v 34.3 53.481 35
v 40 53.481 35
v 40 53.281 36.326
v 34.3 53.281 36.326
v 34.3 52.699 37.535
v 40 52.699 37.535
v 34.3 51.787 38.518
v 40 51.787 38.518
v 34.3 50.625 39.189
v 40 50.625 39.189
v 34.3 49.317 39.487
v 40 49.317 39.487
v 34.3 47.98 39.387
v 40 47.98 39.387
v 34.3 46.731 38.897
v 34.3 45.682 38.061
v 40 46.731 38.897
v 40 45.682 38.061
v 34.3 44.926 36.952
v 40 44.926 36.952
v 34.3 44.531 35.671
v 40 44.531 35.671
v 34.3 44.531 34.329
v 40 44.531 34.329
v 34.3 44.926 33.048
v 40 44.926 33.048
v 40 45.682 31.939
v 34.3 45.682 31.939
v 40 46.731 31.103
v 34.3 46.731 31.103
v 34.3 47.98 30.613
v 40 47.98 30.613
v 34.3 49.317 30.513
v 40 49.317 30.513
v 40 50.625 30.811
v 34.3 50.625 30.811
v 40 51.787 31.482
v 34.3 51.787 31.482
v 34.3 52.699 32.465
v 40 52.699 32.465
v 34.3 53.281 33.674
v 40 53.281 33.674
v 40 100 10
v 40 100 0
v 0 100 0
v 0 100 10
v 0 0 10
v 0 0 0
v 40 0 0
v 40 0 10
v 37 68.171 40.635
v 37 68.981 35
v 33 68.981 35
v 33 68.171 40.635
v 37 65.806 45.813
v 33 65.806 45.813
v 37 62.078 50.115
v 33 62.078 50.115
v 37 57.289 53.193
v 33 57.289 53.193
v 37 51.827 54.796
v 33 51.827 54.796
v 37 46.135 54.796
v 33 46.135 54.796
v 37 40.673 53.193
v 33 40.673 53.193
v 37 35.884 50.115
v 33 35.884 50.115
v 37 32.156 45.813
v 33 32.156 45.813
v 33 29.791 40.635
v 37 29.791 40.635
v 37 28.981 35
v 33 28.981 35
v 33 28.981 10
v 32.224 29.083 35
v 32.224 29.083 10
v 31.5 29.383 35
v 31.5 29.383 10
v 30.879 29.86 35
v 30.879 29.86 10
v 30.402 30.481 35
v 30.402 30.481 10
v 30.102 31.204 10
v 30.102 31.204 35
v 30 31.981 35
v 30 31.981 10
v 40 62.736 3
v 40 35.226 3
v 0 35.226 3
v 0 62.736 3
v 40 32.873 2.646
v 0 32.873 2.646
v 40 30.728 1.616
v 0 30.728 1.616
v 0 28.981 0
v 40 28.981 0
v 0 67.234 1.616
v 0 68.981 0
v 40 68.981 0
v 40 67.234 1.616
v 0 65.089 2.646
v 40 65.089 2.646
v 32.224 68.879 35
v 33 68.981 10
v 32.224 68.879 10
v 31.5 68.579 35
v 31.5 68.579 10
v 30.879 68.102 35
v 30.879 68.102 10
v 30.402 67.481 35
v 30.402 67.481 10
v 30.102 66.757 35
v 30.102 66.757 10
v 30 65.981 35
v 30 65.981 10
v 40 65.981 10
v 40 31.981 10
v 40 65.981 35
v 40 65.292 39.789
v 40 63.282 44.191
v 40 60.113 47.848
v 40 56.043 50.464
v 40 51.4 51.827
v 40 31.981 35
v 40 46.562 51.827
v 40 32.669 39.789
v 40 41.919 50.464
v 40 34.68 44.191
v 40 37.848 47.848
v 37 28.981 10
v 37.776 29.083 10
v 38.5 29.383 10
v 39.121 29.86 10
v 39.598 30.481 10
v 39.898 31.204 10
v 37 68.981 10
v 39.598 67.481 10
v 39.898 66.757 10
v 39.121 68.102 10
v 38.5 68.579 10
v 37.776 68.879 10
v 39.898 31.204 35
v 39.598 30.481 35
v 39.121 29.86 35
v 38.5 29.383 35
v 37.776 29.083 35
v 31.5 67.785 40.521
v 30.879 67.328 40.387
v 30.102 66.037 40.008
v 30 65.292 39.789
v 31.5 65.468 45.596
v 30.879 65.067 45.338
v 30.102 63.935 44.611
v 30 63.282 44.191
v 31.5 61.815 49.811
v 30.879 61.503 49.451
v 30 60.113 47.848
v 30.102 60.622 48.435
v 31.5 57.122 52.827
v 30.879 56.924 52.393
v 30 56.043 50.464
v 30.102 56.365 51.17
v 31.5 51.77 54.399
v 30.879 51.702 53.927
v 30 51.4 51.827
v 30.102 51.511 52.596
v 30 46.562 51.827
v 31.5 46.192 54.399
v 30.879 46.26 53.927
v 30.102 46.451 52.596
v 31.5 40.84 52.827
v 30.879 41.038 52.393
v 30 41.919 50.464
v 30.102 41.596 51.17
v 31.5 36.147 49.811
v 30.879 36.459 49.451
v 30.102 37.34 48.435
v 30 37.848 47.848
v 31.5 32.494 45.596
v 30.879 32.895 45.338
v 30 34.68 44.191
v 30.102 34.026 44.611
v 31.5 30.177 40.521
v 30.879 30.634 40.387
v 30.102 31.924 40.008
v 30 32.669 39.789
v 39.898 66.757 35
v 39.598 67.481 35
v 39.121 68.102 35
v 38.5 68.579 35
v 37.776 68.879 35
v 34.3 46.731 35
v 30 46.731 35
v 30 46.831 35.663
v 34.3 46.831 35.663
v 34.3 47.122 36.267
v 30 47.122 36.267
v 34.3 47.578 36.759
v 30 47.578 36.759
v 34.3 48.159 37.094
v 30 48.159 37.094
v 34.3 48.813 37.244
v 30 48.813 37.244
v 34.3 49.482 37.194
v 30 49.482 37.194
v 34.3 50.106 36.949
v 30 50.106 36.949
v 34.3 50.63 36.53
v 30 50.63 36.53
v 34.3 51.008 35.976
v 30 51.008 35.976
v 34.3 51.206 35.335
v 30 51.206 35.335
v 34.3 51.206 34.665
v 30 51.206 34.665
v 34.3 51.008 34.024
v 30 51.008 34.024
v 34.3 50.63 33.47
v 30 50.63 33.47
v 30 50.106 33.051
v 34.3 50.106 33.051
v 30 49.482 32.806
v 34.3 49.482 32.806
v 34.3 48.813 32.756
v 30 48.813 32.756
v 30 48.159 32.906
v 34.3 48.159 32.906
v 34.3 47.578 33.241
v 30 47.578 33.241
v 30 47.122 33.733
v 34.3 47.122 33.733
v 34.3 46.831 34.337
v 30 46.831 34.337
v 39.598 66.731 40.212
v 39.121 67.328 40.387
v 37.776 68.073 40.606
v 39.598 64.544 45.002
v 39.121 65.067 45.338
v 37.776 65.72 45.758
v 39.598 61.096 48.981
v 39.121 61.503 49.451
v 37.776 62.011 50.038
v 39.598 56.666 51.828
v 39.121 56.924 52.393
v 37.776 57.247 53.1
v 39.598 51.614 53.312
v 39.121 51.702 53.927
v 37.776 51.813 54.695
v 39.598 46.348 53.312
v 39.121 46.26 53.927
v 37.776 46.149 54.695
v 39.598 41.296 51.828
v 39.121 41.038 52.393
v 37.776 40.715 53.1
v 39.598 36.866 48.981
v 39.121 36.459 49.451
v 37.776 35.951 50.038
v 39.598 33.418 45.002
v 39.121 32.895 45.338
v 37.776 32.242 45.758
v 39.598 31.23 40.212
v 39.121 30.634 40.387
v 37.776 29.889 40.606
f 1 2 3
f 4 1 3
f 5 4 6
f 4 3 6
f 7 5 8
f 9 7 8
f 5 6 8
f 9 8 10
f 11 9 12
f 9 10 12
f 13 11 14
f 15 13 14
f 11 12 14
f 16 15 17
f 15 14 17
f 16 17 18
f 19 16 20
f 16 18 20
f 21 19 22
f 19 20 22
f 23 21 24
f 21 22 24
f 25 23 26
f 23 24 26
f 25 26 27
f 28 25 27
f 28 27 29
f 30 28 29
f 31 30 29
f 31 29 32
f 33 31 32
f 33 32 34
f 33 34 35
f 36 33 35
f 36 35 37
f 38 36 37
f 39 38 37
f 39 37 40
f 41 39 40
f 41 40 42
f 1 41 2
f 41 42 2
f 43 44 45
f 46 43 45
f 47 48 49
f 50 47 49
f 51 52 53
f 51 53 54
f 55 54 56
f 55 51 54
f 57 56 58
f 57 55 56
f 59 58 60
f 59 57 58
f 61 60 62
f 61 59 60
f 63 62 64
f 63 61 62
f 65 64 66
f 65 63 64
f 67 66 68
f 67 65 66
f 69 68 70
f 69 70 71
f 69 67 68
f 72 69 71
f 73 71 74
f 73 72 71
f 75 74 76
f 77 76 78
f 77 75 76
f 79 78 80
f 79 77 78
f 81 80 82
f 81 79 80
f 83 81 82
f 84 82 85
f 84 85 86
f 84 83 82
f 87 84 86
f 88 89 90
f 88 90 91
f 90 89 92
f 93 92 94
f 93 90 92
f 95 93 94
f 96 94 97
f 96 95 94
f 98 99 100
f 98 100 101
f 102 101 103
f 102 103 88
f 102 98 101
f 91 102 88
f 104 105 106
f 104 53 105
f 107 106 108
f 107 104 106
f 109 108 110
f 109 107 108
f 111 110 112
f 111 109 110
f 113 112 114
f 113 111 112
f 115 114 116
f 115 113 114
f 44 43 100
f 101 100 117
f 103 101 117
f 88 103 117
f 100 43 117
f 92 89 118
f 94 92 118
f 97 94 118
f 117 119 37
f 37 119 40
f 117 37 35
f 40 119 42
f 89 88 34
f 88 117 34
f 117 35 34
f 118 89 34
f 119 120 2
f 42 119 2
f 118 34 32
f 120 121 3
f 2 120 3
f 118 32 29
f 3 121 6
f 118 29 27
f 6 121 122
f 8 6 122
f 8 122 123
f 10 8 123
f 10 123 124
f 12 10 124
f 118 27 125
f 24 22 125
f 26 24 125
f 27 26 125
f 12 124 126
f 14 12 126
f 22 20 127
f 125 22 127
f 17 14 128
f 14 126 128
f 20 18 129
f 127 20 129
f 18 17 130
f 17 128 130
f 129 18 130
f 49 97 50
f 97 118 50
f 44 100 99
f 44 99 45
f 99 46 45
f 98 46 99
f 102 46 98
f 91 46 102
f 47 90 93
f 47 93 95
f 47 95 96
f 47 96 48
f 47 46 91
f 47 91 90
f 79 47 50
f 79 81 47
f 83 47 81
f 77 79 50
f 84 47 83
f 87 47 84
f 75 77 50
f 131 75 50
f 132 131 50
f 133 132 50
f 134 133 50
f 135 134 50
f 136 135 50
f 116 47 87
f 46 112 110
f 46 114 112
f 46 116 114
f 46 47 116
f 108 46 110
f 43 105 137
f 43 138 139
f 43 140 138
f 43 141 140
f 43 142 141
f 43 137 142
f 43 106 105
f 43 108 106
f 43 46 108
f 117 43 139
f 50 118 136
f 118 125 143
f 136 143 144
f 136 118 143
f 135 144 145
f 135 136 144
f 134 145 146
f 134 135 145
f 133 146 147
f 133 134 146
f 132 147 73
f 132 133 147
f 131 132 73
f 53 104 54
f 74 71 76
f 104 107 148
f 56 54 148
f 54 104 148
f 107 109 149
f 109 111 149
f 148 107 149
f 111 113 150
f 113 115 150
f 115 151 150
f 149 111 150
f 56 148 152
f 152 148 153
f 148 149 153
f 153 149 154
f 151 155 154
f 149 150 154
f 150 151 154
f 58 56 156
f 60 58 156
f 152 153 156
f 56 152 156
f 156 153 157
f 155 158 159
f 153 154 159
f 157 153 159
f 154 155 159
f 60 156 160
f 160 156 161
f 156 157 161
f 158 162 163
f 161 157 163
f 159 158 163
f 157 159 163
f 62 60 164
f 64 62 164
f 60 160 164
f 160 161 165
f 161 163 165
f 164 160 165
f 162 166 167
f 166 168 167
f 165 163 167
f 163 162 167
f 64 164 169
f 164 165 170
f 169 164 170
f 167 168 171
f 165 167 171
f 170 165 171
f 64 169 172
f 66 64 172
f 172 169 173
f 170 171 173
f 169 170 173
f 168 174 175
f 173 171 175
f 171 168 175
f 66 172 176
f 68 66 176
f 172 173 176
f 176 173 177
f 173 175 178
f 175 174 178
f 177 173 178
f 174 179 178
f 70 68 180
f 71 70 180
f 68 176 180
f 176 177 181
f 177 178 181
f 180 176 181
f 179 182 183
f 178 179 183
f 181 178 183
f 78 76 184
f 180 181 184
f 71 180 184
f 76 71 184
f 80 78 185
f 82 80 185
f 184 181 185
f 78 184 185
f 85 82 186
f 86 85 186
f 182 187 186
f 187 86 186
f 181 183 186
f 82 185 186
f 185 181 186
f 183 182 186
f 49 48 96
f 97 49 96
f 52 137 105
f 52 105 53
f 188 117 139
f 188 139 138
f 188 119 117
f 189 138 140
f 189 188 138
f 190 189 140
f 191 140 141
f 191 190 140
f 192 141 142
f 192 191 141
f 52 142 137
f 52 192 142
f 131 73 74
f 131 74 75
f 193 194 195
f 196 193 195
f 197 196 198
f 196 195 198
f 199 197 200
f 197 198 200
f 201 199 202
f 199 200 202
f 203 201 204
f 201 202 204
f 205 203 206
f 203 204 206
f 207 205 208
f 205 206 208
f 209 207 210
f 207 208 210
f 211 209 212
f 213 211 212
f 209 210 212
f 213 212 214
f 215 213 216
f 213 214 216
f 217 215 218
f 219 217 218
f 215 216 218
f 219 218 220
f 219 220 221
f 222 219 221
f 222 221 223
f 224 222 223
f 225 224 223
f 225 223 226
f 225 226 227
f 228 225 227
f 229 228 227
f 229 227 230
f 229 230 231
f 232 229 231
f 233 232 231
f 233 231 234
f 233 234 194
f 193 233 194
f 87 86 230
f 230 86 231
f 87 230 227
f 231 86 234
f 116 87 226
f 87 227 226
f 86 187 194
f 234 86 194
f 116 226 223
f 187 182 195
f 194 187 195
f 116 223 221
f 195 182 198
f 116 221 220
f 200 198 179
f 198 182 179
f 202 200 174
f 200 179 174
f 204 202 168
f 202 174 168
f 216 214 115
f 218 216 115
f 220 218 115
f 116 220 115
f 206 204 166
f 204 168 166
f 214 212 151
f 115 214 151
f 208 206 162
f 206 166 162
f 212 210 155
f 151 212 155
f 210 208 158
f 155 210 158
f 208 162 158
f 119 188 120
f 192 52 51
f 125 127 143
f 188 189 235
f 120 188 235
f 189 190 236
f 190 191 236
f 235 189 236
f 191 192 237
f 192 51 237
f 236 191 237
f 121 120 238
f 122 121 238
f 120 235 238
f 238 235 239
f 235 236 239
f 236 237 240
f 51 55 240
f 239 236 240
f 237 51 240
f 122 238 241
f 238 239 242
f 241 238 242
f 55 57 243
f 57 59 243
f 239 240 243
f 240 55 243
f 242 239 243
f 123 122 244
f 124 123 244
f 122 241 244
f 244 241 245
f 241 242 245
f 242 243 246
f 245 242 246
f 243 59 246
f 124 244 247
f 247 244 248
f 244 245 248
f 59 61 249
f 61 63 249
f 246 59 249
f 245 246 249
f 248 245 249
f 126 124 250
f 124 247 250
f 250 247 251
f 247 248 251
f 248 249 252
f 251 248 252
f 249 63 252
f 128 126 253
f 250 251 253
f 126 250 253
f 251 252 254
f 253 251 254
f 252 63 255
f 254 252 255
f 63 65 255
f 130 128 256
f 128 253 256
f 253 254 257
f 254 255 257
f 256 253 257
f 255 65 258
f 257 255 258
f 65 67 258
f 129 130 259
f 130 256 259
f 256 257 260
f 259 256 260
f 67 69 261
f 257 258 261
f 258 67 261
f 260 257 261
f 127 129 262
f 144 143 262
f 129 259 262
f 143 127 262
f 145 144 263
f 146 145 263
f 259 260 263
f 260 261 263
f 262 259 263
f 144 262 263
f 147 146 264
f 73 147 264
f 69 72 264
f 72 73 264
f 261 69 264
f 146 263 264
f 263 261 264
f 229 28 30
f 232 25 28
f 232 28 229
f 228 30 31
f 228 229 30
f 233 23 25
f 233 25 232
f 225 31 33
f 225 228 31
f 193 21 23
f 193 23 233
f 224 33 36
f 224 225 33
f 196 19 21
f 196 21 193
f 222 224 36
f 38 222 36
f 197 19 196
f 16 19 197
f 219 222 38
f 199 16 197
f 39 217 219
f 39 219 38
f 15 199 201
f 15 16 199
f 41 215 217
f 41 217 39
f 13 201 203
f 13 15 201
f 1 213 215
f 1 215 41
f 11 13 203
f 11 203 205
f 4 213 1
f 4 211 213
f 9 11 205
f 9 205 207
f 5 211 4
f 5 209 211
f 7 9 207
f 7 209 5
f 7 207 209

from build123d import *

# Parameters (mm, degrees)
F1_DEPTH     = 10
F3_DEPTH     = 10
F4_R         = 2.25
F5_DEPTH     = 10.001
F6_W         = 40
F6_H         = 3
F7_DEPTH     = 40.001
F8_R         = 4.5
F9_DEPTH     = 5.7
F10_T1_DEPTH = 40
F11_R        = 3


# Not quite as in the source:
# - a fillet or chamfer that OpenCascade refuses, or shapes differently, is made with other operations: its cross-section is extruded or revolved along the edge and cut away or added


with BuildPart() as f1:
    # F0 (on Top) → F1 (new body)
    with BuildSketch(Plane.XY):
        Polygon((0, 100), (0, 0), (40, 0), (40, 96.7579462998), (40, 100), align=None)
    extrude(amount=F1_DEPTH)

    # F2 (on face) → F3 (join)
    with BuildSketch(Plane.YZ.offset(40)):
        with BuildLine():
            Line((28.9808548987, 35), (28.9808548987, 0))
            Line((28.9808548987, 0), (68.9808548987, 0))
            Line((68.9808548987, 0), (68.9808548987, 35))
            ThreePointArc((68.9808548987, 35), (48.9808548987, 55), (28.9808548987, 35))
        make_face()
    extrude(amount=-F3_DEPTH)

    # F4 (on face) → F5 (cut, through all)
    with BuildSketch(Plane(origin=(30, 0, 0), x_dir=(0, -1, 0), z_dir=(-1, 0, 0))):
        with Locations((-48.9808548987, 35)):
            Circle(F4_R)
    extrude(amount=-F5_DEPTH, mode=Mode.SUBTRACT)

    # F6 (on face) → F7 (cut, through all)
    with BuildSketch(Plane.YZ.offset(40)):
        with Locations((48.9808548987, 1.5)):
            Rectangle(F6_W, F6_H)
    extrude(amount=-F7_DEPTH, mode=Mode.SUBTRACT)

    # F8 (on face) → F9 (cut)
    with BuildSketch(Plane.YZ.offset(40)):
        with Locations((48.9808548987, 35)):
            Circle(F8_R)
    extrude(amount=-F9_DEPTH, mode=Mode.SUBTRACT)

    # F10: fillet of radius 8 on 2 edges, made by hand

    # F10_s2 → F10_t1 (join)
    with BuildSketch(Plane.YZ):
        with BuildLine():
            ThreePointArc((68.9808548987, 0), (66.1999585154, 2.2111025509), (62.7358569003, 3))
            Line((62.7358569003, 3), (68.9808548987, 3))
            Line((68.9808548987, 3), (68.9808548987, 0))
        make_face()
        with BuildLine():
            ThreePointArc((35.2258528971, 3), (31.761751282, 2.2111025509), (28.9808548987, 0))
            Line((28.9808548987, 0), (28.9808548987, 3))
            Line((28.9808548987, 3), (35.2258528971, 3))
        make_face()
    extrude(amount=F10_T1_DEPTH)

    # F11
    f11_edges = [f1.edges().sort_by_distance(p)[0] for p in [
        (40, 68.980855, 22.5),
        (30, 68.980855, 22.5),
        (40, 28.980855, 22.5),
        (40, 48.980855, 55),
        (30, 48.980855, 55),
        (30, 28.980855, 22.5),
    ]]
    fillet(f11_edges, radius=F11_R)


solid = f1.part
